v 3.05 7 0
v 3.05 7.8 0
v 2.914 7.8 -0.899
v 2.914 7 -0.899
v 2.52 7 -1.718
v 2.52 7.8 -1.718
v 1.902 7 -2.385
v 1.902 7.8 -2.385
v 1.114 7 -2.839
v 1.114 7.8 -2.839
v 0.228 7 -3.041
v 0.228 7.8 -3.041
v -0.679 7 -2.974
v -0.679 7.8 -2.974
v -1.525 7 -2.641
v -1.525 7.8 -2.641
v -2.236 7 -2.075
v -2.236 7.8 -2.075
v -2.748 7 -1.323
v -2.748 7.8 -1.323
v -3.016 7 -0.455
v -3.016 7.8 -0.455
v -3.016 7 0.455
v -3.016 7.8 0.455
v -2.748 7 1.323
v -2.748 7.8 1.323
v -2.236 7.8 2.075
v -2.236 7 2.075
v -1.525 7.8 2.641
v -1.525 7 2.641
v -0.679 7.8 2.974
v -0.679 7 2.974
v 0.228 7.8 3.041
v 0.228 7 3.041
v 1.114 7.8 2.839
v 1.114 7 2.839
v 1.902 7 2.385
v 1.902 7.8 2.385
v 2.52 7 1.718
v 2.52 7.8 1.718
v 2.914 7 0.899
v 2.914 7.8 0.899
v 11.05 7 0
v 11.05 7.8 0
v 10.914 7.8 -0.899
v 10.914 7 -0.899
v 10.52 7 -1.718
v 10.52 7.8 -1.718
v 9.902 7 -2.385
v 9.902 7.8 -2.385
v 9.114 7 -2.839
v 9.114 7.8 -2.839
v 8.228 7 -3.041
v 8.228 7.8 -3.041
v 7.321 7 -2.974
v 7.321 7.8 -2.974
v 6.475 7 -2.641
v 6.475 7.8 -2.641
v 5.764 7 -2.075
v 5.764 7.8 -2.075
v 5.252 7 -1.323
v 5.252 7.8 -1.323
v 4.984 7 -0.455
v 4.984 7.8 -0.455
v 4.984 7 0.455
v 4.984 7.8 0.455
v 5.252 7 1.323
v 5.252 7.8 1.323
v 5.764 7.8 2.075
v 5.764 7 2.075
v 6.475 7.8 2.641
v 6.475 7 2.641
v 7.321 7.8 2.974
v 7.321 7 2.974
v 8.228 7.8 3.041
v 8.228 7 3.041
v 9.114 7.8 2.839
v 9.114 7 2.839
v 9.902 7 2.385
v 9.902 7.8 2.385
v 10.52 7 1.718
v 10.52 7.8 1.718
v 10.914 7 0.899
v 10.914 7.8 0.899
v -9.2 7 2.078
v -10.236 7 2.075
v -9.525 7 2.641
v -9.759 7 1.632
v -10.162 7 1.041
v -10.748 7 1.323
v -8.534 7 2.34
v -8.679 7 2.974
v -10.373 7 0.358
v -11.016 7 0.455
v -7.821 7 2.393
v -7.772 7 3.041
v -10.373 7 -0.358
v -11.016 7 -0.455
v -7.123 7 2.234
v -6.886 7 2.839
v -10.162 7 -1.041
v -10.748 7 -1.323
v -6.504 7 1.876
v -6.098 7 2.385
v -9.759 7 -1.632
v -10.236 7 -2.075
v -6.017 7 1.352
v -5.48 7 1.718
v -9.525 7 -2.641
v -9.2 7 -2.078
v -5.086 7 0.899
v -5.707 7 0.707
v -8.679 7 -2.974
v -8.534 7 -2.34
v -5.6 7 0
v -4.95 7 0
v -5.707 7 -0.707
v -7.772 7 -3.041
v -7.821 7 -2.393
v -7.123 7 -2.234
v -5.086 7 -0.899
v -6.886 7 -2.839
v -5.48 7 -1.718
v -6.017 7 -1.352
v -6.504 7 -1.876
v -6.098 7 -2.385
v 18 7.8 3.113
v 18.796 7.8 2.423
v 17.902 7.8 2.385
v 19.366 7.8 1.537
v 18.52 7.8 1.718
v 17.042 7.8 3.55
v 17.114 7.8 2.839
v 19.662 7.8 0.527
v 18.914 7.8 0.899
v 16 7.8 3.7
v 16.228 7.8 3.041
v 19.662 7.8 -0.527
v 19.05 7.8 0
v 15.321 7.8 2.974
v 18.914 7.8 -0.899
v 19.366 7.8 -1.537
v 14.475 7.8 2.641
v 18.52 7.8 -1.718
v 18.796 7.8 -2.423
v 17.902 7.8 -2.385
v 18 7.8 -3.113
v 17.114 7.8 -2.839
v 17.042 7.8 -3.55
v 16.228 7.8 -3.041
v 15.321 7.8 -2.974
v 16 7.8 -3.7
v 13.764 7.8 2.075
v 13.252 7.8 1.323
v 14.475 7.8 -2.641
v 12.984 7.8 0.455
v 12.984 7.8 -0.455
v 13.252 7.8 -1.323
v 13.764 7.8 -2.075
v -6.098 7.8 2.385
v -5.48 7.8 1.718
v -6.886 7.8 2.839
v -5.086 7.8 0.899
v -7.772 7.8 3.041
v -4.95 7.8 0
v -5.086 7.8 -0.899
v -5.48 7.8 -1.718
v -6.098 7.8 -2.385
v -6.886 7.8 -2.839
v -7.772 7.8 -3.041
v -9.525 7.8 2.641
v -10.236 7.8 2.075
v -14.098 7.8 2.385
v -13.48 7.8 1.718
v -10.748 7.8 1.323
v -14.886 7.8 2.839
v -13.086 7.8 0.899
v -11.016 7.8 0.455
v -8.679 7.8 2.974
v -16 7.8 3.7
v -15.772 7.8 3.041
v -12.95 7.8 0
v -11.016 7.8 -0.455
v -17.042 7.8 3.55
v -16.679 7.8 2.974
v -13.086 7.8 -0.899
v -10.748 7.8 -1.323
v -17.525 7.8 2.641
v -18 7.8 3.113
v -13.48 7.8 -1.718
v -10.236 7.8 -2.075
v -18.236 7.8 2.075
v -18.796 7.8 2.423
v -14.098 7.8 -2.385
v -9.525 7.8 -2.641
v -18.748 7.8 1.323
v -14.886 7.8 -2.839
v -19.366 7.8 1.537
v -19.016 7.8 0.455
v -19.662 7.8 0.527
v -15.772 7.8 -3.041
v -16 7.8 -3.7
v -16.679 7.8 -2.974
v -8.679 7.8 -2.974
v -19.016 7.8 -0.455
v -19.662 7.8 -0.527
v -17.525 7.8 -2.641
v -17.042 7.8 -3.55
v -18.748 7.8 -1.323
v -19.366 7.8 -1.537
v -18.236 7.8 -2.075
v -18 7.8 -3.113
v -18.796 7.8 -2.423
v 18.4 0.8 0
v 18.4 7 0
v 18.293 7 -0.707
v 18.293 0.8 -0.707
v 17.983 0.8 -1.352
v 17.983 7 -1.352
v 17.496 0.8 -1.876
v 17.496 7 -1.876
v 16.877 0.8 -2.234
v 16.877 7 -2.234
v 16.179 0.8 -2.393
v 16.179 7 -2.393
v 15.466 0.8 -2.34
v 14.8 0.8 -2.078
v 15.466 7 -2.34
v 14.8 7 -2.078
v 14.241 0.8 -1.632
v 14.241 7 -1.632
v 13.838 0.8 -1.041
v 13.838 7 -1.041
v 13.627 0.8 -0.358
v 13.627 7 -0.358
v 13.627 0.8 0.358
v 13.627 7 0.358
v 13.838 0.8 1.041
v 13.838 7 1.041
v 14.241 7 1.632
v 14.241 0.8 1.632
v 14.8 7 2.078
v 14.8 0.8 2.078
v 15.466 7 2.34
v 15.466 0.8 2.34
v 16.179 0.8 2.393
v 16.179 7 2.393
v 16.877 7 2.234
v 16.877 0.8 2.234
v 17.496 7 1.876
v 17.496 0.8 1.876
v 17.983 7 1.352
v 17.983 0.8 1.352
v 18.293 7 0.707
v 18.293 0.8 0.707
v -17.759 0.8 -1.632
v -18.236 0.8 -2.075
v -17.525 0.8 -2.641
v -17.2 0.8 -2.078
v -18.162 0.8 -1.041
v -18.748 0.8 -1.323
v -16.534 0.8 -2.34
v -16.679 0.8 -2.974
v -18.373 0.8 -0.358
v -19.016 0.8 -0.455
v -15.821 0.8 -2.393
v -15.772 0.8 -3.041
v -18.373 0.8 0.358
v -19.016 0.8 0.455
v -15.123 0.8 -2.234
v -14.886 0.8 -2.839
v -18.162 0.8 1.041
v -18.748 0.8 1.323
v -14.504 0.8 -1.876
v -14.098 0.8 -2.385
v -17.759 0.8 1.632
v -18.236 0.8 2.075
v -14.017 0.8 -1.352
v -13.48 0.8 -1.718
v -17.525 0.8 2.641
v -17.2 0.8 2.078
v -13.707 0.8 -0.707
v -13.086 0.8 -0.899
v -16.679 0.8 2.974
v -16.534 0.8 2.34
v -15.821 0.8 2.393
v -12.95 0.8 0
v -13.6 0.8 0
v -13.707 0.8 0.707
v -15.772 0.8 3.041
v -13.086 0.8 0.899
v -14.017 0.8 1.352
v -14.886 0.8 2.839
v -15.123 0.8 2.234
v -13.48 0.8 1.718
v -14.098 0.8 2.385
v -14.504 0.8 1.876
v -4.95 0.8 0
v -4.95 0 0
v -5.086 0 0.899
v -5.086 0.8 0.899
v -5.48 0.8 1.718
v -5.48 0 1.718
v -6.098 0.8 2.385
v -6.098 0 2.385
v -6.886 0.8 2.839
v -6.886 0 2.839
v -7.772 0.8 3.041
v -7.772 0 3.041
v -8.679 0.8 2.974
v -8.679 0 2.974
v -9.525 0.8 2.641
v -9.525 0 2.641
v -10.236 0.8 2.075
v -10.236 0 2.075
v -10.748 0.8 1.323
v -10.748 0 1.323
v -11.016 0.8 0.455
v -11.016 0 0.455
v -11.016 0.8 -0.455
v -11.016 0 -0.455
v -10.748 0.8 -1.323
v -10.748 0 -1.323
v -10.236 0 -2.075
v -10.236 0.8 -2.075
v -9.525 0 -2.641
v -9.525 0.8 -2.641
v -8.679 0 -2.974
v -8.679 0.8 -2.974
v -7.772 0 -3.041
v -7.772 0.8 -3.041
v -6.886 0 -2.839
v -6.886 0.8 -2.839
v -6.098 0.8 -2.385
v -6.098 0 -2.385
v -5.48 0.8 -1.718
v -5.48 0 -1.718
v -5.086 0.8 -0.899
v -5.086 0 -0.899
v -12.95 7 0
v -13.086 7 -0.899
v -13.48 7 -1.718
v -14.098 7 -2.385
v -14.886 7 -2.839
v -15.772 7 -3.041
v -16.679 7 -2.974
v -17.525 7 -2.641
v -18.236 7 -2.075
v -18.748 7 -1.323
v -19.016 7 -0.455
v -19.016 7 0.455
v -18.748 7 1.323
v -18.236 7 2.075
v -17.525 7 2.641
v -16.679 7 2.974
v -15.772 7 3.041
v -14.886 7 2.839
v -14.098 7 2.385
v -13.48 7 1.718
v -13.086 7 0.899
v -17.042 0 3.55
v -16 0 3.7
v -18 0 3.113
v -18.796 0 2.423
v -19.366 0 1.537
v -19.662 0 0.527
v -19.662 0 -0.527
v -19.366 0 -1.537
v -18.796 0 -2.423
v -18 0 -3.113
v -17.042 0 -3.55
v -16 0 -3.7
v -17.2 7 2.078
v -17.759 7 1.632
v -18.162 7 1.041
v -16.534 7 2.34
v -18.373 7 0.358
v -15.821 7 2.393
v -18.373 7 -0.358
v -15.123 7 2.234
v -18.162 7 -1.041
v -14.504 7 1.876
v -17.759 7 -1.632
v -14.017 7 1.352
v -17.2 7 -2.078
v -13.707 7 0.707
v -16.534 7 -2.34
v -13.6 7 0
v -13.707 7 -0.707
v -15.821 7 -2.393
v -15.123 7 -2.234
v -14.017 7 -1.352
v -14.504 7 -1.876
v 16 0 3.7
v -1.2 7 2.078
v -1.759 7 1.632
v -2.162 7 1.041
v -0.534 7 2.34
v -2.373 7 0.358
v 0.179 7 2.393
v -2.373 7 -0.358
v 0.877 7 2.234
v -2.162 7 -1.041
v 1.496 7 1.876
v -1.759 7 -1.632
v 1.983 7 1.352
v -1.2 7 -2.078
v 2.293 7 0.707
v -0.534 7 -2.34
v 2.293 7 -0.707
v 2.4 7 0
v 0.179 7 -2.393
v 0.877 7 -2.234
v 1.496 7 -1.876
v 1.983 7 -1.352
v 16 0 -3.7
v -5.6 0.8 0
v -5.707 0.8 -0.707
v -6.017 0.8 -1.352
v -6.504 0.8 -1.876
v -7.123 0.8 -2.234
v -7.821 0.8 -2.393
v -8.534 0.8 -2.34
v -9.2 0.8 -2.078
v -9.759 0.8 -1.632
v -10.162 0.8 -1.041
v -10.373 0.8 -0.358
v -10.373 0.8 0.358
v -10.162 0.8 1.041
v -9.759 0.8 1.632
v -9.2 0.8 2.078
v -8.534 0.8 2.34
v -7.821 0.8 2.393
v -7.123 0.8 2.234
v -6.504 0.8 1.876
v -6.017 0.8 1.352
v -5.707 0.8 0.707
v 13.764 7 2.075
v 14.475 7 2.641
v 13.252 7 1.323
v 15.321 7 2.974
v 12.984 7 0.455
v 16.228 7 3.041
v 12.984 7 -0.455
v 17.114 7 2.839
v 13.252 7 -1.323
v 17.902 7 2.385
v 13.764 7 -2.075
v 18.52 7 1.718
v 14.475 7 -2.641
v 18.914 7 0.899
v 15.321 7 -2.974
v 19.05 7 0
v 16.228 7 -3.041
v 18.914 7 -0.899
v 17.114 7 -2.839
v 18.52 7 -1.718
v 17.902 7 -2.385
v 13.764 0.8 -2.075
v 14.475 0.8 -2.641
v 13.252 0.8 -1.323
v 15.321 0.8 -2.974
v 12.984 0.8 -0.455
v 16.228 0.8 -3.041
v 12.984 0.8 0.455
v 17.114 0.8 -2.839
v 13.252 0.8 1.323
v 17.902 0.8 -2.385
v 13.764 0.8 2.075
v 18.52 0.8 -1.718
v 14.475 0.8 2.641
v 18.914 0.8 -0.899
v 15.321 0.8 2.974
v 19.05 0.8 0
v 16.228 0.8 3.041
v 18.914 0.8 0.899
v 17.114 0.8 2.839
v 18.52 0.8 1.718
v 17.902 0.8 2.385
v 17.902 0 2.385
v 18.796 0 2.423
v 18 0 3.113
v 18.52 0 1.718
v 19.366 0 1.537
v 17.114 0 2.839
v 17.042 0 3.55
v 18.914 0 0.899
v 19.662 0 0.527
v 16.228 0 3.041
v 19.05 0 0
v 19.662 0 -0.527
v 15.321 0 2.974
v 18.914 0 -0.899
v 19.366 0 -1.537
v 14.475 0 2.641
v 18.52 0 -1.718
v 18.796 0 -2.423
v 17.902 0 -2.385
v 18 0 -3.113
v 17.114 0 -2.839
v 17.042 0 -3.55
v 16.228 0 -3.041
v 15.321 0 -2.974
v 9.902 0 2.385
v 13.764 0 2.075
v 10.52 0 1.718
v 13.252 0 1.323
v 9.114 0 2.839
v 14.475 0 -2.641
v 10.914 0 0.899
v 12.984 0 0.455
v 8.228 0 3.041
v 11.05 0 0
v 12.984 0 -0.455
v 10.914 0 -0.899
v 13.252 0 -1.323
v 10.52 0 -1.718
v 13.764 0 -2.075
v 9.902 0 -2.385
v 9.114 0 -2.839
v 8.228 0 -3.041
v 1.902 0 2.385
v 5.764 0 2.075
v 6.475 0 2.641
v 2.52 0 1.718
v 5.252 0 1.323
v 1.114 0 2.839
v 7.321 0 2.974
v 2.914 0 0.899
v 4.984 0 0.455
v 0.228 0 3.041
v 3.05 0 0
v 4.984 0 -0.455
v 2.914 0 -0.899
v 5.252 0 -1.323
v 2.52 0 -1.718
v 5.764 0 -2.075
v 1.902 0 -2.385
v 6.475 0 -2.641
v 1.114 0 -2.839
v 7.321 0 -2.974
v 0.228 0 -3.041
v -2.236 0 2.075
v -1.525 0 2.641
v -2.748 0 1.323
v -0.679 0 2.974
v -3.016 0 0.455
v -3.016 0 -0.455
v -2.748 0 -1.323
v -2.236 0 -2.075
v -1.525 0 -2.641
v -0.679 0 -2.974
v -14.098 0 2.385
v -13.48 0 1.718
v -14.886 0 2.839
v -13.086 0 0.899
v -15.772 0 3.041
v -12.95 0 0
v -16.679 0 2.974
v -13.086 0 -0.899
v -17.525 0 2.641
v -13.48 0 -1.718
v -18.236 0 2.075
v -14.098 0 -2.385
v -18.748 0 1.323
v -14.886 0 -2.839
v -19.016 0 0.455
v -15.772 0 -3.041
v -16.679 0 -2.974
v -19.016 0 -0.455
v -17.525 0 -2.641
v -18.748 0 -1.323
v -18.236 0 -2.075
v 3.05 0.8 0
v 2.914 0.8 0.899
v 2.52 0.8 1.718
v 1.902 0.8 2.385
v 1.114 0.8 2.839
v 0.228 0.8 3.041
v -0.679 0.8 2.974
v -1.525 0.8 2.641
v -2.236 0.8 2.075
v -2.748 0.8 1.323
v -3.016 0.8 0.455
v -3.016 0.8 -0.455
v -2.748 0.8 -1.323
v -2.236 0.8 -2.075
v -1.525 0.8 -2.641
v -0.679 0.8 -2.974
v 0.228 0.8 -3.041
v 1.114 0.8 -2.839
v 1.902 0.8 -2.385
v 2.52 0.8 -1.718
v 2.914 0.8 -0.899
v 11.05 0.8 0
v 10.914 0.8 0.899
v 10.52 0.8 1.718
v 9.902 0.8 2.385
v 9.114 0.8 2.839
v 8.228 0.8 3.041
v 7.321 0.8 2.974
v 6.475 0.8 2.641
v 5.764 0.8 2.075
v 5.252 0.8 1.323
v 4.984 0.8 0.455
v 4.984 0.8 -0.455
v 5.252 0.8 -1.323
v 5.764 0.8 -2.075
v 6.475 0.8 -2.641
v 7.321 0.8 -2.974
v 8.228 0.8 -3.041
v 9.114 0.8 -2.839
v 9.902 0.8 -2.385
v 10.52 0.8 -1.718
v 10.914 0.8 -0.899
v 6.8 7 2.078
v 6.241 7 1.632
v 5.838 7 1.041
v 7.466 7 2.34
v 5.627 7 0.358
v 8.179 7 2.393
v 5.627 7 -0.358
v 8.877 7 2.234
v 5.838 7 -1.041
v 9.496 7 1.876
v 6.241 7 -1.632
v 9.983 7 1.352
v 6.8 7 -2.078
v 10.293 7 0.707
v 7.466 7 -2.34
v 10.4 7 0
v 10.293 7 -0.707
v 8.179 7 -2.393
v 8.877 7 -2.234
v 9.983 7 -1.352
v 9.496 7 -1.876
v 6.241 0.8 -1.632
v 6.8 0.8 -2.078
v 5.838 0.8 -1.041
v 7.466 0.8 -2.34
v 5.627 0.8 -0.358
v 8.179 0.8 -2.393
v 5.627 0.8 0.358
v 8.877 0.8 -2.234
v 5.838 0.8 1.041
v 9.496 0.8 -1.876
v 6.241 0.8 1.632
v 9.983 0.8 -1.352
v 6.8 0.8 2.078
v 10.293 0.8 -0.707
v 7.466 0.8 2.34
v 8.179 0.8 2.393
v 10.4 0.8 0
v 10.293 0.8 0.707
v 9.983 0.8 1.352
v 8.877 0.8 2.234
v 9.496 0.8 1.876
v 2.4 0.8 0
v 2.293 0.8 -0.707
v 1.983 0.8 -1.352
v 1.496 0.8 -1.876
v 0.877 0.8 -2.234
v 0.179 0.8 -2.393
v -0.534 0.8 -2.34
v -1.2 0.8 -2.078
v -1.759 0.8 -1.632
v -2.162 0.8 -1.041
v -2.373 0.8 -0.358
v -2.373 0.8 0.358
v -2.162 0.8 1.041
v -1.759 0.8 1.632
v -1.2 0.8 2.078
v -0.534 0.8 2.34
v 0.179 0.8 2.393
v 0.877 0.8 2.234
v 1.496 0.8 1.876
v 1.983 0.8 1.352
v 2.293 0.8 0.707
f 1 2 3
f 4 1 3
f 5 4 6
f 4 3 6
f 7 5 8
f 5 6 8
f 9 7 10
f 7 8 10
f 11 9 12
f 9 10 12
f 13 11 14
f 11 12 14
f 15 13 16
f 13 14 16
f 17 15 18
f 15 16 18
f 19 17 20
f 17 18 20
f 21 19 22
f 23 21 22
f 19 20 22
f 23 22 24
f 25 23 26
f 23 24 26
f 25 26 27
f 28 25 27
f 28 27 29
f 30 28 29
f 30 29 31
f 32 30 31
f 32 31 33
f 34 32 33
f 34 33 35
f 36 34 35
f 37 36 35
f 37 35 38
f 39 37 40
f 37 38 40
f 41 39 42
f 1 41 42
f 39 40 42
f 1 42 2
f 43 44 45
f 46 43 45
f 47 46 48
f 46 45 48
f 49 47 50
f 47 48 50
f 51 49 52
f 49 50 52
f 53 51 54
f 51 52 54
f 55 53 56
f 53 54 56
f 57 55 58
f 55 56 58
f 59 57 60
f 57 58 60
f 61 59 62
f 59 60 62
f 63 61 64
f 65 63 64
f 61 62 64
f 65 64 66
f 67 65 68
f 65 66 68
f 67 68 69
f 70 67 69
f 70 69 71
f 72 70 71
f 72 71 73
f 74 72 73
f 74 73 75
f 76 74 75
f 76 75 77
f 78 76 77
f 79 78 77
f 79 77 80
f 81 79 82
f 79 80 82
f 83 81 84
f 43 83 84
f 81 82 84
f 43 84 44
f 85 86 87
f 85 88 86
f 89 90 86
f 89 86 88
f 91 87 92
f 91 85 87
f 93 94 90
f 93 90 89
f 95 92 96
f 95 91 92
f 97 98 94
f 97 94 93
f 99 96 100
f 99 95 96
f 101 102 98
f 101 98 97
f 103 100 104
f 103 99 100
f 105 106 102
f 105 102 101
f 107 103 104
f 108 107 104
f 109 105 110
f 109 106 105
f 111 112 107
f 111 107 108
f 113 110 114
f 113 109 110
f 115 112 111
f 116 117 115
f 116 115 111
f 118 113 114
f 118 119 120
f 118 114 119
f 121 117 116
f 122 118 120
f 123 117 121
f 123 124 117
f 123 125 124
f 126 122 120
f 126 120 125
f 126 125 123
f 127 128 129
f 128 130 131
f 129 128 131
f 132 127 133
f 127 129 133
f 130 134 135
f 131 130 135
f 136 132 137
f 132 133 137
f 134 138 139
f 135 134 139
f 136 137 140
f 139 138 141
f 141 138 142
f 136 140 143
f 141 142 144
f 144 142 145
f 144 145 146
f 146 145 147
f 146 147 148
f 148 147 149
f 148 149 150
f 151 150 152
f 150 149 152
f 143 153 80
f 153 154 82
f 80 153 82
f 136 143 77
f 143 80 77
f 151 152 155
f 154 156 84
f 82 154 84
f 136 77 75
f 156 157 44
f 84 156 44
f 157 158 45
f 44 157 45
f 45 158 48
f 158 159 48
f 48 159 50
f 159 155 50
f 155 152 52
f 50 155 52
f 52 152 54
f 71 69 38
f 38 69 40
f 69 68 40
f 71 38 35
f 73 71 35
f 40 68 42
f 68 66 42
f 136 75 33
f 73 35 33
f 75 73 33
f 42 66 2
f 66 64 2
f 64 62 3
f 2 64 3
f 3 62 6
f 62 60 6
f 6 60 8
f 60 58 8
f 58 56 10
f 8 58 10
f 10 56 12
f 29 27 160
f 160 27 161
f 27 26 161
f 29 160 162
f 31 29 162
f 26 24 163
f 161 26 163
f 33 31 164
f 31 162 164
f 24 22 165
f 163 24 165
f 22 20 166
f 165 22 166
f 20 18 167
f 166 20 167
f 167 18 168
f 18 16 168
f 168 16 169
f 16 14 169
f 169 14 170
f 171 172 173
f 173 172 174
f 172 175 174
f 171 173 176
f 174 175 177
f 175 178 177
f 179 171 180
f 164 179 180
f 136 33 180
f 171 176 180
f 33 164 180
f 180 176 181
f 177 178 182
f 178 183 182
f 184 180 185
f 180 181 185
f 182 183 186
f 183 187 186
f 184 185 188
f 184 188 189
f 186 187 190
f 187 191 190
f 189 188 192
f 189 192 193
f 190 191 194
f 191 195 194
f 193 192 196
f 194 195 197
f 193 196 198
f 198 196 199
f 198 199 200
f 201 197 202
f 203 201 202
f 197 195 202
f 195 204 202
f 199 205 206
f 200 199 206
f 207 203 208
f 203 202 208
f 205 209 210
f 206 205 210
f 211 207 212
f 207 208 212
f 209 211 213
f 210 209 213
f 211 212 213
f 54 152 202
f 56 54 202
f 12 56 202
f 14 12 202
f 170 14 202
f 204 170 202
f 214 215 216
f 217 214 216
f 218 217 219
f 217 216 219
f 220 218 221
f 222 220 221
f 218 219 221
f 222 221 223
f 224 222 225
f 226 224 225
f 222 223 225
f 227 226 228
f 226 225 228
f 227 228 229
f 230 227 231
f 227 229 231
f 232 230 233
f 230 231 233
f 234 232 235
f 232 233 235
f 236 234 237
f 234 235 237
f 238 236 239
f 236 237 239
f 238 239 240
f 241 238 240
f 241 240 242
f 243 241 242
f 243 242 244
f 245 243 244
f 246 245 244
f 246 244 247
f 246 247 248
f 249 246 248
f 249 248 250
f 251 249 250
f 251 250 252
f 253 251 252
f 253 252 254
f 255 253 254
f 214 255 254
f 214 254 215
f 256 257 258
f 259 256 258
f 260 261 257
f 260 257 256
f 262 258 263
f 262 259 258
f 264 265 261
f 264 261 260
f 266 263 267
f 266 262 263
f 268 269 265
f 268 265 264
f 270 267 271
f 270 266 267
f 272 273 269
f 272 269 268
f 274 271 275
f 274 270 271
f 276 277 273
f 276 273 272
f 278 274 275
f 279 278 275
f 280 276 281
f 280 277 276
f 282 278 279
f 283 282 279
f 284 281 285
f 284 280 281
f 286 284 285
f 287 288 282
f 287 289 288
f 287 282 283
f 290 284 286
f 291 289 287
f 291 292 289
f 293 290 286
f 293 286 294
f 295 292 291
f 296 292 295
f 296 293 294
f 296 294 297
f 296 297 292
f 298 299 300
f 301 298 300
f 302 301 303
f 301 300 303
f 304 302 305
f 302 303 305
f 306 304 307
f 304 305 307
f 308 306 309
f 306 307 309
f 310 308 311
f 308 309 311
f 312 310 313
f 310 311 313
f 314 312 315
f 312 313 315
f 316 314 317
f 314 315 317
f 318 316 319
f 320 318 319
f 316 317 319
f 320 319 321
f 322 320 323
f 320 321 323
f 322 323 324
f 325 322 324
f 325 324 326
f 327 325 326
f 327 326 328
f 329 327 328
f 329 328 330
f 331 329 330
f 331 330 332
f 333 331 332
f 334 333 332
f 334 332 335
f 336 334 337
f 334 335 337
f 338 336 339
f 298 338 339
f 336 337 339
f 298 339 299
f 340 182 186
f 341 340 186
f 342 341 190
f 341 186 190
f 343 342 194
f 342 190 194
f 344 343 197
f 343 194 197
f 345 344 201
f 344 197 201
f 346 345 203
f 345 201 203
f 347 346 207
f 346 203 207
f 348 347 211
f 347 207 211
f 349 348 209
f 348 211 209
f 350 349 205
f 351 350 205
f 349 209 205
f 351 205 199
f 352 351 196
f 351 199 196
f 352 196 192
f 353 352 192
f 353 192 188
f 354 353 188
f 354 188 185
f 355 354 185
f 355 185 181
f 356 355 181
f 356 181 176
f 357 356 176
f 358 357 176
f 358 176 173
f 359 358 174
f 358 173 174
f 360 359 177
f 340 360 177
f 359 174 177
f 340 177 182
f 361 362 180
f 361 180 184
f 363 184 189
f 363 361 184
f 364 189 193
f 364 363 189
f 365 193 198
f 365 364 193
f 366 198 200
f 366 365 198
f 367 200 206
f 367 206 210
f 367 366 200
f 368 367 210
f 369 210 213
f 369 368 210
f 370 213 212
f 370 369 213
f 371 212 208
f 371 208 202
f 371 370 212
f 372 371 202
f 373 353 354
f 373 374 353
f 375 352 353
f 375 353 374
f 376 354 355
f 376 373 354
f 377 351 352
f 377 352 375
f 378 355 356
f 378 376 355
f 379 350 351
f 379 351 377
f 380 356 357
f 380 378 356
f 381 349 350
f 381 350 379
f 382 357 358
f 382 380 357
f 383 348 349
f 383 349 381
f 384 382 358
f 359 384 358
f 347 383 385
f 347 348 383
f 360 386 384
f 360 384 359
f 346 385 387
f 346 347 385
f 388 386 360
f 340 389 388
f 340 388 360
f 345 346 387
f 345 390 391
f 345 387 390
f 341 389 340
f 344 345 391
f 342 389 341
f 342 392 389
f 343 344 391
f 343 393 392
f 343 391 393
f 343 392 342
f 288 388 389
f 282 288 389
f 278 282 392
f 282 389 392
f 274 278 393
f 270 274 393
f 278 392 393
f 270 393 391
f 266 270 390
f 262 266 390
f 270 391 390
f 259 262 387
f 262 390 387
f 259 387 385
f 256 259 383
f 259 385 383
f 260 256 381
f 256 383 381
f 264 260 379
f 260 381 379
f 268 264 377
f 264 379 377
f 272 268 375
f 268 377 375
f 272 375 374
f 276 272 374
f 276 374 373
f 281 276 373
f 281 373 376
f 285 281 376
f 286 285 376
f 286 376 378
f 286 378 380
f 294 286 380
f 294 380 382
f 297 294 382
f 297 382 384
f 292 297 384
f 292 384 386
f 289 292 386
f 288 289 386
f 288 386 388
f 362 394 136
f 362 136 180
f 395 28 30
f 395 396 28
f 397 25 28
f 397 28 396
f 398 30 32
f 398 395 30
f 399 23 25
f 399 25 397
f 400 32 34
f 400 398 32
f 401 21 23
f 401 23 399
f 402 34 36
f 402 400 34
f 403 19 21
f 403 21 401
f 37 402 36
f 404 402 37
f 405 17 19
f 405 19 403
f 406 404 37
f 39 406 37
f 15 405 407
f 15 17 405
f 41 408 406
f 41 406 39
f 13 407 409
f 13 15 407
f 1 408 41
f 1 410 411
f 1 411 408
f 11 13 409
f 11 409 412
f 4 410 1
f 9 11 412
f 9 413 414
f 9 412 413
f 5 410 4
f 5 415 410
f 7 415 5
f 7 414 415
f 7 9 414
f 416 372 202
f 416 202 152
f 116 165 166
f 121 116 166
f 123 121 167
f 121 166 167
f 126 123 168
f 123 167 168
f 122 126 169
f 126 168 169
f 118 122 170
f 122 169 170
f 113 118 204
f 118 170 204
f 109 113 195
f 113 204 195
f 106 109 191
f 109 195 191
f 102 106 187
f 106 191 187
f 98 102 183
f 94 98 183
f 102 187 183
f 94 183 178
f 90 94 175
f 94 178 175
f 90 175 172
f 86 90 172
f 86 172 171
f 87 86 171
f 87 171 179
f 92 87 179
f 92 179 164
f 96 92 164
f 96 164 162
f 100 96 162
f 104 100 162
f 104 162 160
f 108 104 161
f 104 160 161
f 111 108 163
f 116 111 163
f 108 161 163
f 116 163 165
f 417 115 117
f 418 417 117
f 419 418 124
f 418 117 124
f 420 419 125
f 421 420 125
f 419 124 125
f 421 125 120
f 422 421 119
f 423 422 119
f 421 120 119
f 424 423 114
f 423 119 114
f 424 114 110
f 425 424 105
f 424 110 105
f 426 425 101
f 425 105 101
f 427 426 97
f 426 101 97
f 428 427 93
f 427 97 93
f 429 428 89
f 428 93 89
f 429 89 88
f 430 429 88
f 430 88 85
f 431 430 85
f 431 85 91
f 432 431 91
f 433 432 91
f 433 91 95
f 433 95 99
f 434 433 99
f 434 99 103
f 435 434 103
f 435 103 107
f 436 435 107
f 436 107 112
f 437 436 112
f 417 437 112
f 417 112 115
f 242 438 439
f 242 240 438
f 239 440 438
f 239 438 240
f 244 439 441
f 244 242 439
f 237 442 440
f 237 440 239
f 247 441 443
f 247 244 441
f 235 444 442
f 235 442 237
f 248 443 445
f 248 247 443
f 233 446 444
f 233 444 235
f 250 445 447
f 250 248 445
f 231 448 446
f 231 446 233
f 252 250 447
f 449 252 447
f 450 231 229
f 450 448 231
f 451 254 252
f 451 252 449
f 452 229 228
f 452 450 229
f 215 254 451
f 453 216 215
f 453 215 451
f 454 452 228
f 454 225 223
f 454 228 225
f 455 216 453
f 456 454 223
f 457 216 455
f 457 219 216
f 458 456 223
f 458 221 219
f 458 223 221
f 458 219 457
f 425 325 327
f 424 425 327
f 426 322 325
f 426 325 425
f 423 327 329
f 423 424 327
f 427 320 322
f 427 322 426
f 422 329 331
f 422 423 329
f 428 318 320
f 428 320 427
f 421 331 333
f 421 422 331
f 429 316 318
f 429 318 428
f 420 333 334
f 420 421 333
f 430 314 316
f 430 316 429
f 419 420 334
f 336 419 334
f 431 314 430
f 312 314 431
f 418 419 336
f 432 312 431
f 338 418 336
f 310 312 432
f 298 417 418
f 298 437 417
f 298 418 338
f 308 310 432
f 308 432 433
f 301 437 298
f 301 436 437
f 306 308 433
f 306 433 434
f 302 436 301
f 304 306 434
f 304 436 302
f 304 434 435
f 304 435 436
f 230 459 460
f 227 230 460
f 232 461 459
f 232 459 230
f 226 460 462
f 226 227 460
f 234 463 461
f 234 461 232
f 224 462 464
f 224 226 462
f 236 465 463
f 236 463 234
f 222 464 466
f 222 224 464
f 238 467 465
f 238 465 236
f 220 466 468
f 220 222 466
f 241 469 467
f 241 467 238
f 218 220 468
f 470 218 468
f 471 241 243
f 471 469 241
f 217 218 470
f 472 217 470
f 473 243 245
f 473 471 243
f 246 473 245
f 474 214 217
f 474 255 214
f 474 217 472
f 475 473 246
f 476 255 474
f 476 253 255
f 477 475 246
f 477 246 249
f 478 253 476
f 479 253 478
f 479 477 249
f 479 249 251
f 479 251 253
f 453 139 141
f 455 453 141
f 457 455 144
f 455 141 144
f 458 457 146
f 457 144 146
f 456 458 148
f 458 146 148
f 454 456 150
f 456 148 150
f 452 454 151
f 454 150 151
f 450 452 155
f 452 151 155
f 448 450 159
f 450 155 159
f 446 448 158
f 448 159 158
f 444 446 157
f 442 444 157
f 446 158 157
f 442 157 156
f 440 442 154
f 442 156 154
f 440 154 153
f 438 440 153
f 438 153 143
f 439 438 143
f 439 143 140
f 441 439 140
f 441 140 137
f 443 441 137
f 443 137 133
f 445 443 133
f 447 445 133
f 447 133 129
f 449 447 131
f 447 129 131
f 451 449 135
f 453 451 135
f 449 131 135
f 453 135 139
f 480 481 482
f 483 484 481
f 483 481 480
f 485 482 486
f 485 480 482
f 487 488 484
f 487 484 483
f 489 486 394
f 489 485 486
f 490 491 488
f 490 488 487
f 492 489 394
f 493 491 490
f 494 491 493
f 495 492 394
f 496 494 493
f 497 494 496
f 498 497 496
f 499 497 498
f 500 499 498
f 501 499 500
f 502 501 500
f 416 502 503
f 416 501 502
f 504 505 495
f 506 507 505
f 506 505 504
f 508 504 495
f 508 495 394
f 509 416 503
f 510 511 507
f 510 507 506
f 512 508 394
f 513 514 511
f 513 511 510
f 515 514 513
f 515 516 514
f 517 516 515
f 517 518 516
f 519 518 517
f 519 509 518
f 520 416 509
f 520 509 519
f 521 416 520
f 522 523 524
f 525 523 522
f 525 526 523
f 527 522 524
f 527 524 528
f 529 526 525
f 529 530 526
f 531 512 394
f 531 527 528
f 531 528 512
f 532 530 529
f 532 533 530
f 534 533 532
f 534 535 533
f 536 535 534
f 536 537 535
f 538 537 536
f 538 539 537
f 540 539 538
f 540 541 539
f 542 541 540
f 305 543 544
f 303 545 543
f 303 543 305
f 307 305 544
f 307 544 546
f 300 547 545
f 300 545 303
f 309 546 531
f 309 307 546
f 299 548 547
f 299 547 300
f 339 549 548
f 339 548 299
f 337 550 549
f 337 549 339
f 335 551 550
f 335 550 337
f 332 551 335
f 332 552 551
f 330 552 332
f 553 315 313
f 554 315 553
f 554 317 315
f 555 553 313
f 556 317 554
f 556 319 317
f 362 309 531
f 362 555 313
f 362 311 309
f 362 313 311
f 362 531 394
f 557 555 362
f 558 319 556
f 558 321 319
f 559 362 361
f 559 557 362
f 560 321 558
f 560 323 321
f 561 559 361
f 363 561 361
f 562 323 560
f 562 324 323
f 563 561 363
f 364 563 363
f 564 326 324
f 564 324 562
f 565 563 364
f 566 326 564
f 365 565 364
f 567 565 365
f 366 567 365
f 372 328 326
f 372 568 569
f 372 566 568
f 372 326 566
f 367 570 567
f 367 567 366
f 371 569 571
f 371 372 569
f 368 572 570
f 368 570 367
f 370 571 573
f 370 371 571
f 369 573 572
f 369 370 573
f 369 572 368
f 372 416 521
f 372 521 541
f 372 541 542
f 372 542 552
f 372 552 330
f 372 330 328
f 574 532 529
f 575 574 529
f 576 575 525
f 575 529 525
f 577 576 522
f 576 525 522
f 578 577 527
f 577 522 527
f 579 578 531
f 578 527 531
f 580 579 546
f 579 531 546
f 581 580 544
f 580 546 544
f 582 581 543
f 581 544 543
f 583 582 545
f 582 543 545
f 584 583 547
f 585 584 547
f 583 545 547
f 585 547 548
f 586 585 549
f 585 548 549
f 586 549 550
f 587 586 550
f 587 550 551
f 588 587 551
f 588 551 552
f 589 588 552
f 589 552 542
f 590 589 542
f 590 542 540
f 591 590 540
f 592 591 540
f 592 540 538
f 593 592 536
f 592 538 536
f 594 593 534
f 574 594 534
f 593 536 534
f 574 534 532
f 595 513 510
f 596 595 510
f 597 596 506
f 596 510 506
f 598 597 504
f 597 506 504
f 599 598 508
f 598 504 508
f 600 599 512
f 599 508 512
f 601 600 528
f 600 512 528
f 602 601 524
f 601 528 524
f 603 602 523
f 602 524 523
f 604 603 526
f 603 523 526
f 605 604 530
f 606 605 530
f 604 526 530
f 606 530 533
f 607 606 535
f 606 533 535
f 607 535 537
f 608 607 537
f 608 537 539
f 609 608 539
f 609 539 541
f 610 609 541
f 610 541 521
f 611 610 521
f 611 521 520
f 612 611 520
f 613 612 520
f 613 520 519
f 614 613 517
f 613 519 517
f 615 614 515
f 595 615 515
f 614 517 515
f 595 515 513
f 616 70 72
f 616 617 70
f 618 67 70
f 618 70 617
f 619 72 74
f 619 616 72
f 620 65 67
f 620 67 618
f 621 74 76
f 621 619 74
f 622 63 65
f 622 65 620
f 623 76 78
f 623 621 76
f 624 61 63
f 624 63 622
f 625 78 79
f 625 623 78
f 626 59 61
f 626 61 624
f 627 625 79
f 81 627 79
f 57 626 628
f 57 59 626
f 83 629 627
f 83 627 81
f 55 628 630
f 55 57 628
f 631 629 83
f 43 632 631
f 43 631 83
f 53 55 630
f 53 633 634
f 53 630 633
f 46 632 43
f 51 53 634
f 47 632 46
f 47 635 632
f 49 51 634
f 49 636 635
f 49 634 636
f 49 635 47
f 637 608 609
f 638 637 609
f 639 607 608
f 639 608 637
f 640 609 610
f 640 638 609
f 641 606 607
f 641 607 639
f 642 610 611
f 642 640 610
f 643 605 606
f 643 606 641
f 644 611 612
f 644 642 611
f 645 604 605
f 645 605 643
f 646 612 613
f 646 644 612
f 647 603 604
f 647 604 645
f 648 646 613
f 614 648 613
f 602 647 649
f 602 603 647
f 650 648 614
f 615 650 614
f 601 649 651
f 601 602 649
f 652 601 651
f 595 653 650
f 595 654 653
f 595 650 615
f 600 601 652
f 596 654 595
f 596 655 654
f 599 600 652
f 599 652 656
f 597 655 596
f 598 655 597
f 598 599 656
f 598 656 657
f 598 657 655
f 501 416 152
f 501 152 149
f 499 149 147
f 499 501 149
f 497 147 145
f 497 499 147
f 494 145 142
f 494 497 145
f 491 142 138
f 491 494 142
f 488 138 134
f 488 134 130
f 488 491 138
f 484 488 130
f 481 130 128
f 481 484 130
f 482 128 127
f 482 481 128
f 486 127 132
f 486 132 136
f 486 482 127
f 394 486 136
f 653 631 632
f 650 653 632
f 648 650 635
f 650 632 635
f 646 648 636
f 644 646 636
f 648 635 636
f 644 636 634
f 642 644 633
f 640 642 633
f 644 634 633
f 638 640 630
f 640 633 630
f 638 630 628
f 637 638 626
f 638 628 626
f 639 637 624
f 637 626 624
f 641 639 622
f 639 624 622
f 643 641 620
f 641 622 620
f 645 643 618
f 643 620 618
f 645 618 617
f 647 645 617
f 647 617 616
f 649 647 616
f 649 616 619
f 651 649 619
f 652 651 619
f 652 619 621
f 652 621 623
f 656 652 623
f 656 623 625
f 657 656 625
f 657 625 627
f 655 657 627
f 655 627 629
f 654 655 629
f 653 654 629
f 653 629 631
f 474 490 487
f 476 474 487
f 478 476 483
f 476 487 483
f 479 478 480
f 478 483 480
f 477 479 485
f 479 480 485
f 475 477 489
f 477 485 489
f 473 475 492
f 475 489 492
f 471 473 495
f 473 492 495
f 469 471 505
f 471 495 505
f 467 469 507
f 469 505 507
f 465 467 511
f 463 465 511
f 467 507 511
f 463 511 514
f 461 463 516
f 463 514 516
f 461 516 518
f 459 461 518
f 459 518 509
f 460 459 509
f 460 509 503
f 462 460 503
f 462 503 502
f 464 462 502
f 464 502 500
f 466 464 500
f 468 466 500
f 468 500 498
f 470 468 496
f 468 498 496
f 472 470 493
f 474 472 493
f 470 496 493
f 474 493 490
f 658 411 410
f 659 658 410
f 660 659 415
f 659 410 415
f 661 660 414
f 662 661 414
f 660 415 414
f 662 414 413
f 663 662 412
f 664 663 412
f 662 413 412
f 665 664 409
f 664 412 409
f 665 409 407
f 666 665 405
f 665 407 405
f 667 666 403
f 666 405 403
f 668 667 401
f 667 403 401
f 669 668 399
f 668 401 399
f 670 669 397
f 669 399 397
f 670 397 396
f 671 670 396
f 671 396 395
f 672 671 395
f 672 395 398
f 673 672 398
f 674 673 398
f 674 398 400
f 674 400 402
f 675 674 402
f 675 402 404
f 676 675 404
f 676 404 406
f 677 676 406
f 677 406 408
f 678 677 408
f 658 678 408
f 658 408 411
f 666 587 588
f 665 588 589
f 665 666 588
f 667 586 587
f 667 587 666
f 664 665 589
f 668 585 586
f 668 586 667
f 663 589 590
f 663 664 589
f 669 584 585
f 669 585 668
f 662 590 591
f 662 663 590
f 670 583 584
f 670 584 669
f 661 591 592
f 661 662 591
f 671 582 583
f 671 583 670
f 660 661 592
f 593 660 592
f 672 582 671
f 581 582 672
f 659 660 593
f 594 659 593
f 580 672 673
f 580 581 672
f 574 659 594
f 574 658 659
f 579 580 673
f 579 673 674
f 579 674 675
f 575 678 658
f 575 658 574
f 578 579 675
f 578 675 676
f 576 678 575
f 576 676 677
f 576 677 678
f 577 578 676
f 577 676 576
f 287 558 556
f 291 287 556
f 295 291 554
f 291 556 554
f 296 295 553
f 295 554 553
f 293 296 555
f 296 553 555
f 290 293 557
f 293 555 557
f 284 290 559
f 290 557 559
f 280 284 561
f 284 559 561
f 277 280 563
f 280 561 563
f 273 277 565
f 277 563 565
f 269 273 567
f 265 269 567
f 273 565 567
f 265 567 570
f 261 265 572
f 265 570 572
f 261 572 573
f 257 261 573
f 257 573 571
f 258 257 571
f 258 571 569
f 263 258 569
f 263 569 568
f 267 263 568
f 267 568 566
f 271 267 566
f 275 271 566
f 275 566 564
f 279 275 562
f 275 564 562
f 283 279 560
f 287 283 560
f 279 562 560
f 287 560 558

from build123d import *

# Parameters (mm, degrees)
BOSS_EXTRUDE3_DEPTH = 7.8
SKETCH2_R           = 2.4
CUT_EXTRUDE6_DEPTH  = 7.8
SKETCH3_R           = 3.05
CUT_EXTRUDE7_DEPTH  = 0.8
SKETCH4_R           = 3.05
CUT_EXTRUDE8_DEPTH  = 0.8


with BuildPart() as part:
    # Sketch1 → Boss-Extrude3 (new body)
    with BuildSketch(Plane(origin=(0, 0, 0), x_dir=(1, 0, 0), z_dir=(0, 1, 0))):
        with BuildLine():
            Line((-16, 3.7), (16, 3.7))
            ThreePointArc((16, 3.7), (19.7, 0), (16, -3.7))
            Line((16, -3.7), (0, -3.7))
            Line((0, -3.7), (-16, -3.7))
            ThreePointArc((-16, -3.7), (-19.7, 0), (-16, 3.7))
        make_face()
    extrude(amount=BOSS_EXTRUDE3_DEPTH)

    # Sketch2 → Cut-Extrude6 (cut)
    with BuildSketch(Plane(origin=(0, 7.8, 0), x_dir=(1, 0, 0), z_dir=(0, 1, 0))):
        Circle(SKETCH2_R)
        with Locations((8, 0)):
            Circle(SKETCH2_R)
        with Locations((16, 0)):
            Circle(SKETCH2_R)
        with Locations((-16, 0)):
            Circle(SKETCH2_R)
        with Locations((-8, 0)):
            Circle(SKETCH2_R)
    extrude(amount=-CUT_EXTRUDE6_DEPTH, mode=Mode.SUBTRACT)

    # Sketch3 → Cut-Extrude7 (cut)
    with BuildSketch(Plane(origin=(0, 7.8, 0), x_dir=(1, 0, 0), z_dir=(0, 1, 0))):
        Circle(SKETCH3_R)
        with Locations((8, 0)):
            Circle(SKETCH3_R)
        with Locations((16, 0)):
            Circle(SKETCH3_R)
        with Locations((-16, 0)):
            Circle(SKETCH3_R)
        with Locations((-8, 0)):
            Circle(SKETCH3_R)
    extrude(amount=-CUT_EXTRUDE7_DEPTH, mode=Mode.SUBTRACT)

    # Sketch4 → Cut-Extrude8 (cut)
    with BuildSketch(Plane.XZ):
        Circle(SKETCH4_R)
        with Locations((8, 0)):
            Circle(SKETCH4_R)
        with Locations((16, 0)):
            Circle(SKETCH4_R)
        with Locations((-16, 0)):
            Circle(SKETCH4_R)
        with Locations((-8, 0)):
            Circle(SKETCH4_R)
    extrude(amount=-CUT_EXTRUDE8_DEPTH, mode=Mode.SUBTRACT)


solid = part.part
